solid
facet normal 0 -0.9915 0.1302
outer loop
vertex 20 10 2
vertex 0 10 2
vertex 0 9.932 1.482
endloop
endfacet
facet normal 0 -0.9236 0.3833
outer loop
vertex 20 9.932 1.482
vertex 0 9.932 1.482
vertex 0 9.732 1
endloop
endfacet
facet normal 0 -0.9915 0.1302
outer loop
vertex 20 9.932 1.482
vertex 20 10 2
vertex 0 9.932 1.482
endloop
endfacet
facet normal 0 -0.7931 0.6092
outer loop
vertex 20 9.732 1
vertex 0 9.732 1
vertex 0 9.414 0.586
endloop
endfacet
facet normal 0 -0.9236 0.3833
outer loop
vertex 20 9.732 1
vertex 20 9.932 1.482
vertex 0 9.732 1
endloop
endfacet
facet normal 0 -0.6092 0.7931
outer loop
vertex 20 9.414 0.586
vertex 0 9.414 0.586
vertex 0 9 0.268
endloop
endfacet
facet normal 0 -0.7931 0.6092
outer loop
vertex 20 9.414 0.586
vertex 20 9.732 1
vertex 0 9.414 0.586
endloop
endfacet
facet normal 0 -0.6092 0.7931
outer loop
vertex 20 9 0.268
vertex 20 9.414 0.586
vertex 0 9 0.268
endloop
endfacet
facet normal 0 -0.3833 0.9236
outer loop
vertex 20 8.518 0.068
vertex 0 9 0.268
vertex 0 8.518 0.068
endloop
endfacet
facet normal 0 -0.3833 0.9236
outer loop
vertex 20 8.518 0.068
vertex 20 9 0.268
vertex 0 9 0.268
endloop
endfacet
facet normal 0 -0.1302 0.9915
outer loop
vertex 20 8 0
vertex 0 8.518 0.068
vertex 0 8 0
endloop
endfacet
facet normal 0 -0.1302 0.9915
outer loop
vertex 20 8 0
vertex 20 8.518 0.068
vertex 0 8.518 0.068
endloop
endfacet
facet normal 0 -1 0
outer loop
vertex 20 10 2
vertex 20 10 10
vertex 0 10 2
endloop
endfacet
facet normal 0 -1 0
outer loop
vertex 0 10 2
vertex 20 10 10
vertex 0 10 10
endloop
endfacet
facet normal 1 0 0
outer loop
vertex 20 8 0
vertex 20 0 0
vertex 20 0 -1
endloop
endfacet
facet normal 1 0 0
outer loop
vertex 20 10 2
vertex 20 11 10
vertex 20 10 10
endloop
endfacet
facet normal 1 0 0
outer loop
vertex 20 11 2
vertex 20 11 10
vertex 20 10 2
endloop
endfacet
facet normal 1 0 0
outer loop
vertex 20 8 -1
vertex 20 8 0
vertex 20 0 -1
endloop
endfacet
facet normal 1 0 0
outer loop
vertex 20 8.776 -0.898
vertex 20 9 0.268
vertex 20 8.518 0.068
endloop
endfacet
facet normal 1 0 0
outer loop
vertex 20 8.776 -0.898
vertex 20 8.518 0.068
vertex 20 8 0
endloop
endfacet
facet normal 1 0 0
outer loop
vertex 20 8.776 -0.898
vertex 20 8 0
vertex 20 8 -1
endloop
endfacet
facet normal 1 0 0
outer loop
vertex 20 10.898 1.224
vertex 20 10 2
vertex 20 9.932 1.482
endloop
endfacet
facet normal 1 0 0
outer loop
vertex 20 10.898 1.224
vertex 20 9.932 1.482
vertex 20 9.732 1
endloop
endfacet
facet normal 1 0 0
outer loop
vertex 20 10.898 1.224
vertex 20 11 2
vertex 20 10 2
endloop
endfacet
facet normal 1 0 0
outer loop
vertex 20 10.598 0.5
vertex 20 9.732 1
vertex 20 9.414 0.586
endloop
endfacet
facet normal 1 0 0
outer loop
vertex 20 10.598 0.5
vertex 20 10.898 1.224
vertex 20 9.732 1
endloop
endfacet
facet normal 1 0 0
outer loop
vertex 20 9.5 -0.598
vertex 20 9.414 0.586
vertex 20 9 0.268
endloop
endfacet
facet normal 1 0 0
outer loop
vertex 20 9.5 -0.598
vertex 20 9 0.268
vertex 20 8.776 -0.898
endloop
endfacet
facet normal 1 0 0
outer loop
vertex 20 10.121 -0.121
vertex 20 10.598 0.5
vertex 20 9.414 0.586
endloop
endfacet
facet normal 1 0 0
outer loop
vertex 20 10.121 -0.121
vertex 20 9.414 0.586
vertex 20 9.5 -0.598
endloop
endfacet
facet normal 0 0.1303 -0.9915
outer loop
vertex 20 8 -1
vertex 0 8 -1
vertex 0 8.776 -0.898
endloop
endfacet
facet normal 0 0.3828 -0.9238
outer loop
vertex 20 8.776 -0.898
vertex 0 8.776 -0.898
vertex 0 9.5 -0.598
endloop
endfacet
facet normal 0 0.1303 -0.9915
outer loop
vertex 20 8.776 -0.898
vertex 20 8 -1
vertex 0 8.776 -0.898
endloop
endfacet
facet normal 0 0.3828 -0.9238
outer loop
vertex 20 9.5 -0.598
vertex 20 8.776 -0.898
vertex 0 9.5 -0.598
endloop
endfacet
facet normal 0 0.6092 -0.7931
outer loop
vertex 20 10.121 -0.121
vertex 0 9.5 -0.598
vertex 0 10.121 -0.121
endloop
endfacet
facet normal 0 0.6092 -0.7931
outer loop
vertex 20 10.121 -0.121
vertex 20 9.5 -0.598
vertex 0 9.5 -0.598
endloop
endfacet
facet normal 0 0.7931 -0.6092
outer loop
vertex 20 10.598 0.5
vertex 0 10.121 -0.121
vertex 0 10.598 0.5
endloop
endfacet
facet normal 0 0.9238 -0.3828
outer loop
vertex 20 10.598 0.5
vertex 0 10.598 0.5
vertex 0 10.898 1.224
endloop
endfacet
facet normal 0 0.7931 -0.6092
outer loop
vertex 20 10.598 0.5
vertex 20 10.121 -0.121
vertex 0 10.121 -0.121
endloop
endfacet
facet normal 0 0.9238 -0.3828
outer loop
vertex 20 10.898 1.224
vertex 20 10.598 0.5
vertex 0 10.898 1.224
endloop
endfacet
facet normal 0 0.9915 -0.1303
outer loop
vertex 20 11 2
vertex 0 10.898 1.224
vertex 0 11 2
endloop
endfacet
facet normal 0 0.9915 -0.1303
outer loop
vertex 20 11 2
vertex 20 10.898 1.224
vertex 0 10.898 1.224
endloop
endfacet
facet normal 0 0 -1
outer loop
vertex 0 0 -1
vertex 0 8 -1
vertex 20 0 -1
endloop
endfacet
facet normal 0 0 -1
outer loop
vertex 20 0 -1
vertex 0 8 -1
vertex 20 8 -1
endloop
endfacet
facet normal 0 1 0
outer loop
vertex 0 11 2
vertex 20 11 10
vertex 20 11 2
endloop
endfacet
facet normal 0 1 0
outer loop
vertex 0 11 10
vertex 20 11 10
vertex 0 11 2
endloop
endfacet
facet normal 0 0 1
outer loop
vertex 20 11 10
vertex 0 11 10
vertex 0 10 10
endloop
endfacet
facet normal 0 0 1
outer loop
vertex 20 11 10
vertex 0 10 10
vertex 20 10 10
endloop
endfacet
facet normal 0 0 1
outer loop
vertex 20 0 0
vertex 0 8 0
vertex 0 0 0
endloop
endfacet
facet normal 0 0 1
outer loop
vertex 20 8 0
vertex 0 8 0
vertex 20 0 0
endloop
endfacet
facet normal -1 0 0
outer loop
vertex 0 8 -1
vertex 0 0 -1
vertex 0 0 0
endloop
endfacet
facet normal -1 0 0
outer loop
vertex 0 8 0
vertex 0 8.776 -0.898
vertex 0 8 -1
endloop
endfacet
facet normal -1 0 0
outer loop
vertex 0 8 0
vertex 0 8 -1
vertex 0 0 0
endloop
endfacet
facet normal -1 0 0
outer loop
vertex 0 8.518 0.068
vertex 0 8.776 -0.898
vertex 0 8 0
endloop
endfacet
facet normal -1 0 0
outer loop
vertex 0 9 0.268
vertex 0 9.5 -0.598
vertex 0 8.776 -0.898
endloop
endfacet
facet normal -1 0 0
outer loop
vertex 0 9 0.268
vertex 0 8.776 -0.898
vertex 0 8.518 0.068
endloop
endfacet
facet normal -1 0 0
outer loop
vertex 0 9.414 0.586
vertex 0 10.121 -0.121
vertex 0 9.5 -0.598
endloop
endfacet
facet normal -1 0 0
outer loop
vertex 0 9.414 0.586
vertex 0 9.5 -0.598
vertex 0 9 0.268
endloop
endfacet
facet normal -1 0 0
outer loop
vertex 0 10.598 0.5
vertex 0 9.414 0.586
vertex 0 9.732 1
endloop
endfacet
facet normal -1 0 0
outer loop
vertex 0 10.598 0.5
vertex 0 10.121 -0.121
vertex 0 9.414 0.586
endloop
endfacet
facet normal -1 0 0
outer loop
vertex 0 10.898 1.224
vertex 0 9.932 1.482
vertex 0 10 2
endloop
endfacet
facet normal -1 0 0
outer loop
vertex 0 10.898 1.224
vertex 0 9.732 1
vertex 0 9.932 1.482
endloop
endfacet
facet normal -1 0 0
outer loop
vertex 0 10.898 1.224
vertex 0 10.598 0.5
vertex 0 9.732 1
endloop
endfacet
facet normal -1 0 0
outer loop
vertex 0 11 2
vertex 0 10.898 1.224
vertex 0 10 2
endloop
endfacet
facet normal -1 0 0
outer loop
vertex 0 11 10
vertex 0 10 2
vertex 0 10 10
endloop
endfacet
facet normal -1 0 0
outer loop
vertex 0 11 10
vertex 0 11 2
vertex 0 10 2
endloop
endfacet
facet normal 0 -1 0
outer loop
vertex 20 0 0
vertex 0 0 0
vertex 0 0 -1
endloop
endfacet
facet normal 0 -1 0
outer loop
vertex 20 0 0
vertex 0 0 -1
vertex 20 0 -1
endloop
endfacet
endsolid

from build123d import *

# Parameters (mm, degrees)
SKETCH_1_W                 = 20
SKETCH_1_H                 = 10
BASEPLATE_DEPTH            = 1
EDGEFLANGE_STRIP_W         = 8
EDGEFLANGE_STRIP_H         = 1
EDGEFLANGE_STRIP_CUT_DEPTH = 20
EDGEFLANGE_DEPTH           = 20
EDGEFLANGE_START           = 1
EDGEFLANGE_FLAT_DEPTH      = 1


# Sheet-metal steps are written as plain solids
with BuildPart() as part:
    # Sketch 1 → BasePlate (new body)
    with BuildSketch(Plane.XY):
        with Locations((10, 5)):
            Rectangle(SKETCH_1_W, SKETCH_1_H)
    extrude(amount=-BASEPLATE_DEPTH)

    # EdgeFlange strip (across the edge) → EdgeFlange strip cut (cut)
    with BuildSketch(Plane(origin=(20, 10, 0), x_dir=(0, -1, 0), z_dir=(-1, 0, 0))):
        with Locations((-2, -0.5)):
            Rectangle(EDGEFLANGE_STRIP_W, EDGEFLANGE_STRIP_H)
    extrude(amount=EDGEFLANGE_STRIP_CUT_DEPTH, mode=Mode.SUBTRACT)

    # EdgeFlange bend section (across the edge) → EdgeFlange (add)
    with BuildSketch(Plane(origin=(20, 10, 0), x_dir=(0, -1, 0), z_dir=(-1, 0, 0))):
        with BuildLine():
            Line((-1, 2), (0, 2))
            ThreePointArc((0, 2), (0.585786438, 0.585786438), (2, 0))
            Line((2, 0), (2, -1))
            ThreePointArc((2, -1), (-0.121320344, -0.121320344), (-1, 2))
        make_face()
    extrude(amount=EDGEFLANGE_DEPTH)

    # EdgeFlange profile (on flange) → EdgeFlange flat (add)
    with BuildSketch(Plane(origin=(0, 10, 0), x_dir=(-1, 0, 0), z_dir=(0, 1, 0)).offset(EDGEFLANGE_START)):
        Polygon((-20, 10), (-20, 2), (0, 2), (0, 10), (-2, 10), (-18, 10), align=None)
    extrude(amount=-EDGEFLANGE_FLAT_DEPTH)


solid = part.part
